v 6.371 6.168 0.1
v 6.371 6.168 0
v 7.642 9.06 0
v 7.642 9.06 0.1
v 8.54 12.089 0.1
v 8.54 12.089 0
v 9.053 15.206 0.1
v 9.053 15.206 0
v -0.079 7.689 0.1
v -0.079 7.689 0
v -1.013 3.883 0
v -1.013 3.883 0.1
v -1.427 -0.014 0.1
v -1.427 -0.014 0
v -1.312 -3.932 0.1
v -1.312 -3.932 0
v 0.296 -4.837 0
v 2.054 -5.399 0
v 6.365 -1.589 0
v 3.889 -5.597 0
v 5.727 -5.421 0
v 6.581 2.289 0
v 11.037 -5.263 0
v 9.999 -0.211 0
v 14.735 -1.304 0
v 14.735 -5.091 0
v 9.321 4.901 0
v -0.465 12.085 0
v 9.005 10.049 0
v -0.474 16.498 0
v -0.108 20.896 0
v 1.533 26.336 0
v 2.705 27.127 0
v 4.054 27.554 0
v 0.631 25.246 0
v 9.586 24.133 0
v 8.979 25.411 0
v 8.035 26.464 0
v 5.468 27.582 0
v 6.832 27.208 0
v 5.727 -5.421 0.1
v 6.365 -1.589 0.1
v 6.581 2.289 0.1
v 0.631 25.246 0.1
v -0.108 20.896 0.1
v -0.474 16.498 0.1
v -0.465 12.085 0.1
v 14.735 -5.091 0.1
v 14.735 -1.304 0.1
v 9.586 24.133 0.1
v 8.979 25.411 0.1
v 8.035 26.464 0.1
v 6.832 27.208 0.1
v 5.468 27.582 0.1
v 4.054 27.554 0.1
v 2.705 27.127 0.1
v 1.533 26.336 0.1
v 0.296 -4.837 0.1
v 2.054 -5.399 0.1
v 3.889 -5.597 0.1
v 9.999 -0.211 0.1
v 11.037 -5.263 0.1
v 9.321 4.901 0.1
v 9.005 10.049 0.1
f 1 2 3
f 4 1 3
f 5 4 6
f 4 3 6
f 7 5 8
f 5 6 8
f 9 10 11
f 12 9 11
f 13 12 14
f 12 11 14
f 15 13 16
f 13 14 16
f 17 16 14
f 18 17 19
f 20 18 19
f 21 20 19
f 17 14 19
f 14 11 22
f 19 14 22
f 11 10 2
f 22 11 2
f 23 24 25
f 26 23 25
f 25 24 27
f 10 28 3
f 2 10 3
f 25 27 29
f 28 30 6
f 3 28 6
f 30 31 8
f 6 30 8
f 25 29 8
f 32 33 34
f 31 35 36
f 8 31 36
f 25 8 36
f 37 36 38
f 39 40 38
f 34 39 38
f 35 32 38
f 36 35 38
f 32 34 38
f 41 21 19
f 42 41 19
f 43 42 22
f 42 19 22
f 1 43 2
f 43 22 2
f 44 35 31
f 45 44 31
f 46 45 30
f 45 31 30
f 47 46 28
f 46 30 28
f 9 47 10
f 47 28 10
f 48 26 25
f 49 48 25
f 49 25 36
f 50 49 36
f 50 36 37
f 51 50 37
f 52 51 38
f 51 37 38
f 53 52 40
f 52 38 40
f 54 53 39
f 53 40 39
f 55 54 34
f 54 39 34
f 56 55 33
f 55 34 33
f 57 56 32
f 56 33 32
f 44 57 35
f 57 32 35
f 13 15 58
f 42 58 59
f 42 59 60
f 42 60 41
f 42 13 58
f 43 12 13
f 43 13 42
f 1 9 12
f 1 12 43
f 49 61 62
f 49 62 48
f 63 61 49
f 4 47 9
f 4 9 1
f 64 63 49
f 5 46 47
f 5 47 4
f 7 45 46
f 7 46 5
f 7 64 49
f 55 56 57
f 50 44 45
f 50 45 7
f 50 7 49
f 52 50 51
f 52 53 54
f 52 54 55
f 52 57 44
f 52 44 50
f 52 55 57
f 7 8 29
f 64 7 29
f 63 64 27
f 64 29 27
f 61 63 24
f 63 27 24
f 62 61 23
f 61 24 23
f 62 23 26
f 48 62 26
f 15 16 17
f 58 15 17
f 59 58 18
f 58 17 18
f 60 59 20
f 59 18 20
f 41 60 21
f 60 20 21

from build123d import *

# Parameters (mm, degrees)
SALIENTE_EXTRUIR1_DEPTH = 0.1


with BuildPart() as part:
    # Model → Saliente-Extruir1 (new body)
    with BuildSketch(Plane.XY):
        with BuildLine():
            Line((14.734818135, -5.091278375), (14.734818135, -1.303795454))
            Line((14.734818135, -1.303795454), (9.586125983, 24.133225595))
            ThreePointArc((9.586125983, 24.133225595), (5.468112004, 27.581522666), (0.631193944, 25.246353401))
            ThreePointArc((0.631193944, 25.246353401), (-0.474240962, 16.497831322), (-0.079037247, 7.688606673))
            ThreePointArc((-0.079037247, 7.688606673), (-1.286055473, 1.941103292), (-1.312470922, -3.931714629))
            ThreePointArc((-1.312470922, -3.931714629), (2.054115678, -5.399292803), (5.726611642, -5.420843381))
            ThreePointArc((5.726611642, -5.420843381), (6.52637867, 0.347218865), (6.371178308, 6.168394193))
            ThreePointArc((6.371178308, 6.168394193), (8.138725842, 10.560479173), (9.052593122, 15.205851208))
            ThreePointArc((9.052593122, 15.205851208), (9.320849308, 4.901113732), (11.037087709, -5.263240729))
            Line((11.037087709, -5.263240729), (14.734818135, -5.091278375))
        make_face()
    extrude(amount=SALIENTE_EXTRUIR1_DEPTH)


solid = part.part
